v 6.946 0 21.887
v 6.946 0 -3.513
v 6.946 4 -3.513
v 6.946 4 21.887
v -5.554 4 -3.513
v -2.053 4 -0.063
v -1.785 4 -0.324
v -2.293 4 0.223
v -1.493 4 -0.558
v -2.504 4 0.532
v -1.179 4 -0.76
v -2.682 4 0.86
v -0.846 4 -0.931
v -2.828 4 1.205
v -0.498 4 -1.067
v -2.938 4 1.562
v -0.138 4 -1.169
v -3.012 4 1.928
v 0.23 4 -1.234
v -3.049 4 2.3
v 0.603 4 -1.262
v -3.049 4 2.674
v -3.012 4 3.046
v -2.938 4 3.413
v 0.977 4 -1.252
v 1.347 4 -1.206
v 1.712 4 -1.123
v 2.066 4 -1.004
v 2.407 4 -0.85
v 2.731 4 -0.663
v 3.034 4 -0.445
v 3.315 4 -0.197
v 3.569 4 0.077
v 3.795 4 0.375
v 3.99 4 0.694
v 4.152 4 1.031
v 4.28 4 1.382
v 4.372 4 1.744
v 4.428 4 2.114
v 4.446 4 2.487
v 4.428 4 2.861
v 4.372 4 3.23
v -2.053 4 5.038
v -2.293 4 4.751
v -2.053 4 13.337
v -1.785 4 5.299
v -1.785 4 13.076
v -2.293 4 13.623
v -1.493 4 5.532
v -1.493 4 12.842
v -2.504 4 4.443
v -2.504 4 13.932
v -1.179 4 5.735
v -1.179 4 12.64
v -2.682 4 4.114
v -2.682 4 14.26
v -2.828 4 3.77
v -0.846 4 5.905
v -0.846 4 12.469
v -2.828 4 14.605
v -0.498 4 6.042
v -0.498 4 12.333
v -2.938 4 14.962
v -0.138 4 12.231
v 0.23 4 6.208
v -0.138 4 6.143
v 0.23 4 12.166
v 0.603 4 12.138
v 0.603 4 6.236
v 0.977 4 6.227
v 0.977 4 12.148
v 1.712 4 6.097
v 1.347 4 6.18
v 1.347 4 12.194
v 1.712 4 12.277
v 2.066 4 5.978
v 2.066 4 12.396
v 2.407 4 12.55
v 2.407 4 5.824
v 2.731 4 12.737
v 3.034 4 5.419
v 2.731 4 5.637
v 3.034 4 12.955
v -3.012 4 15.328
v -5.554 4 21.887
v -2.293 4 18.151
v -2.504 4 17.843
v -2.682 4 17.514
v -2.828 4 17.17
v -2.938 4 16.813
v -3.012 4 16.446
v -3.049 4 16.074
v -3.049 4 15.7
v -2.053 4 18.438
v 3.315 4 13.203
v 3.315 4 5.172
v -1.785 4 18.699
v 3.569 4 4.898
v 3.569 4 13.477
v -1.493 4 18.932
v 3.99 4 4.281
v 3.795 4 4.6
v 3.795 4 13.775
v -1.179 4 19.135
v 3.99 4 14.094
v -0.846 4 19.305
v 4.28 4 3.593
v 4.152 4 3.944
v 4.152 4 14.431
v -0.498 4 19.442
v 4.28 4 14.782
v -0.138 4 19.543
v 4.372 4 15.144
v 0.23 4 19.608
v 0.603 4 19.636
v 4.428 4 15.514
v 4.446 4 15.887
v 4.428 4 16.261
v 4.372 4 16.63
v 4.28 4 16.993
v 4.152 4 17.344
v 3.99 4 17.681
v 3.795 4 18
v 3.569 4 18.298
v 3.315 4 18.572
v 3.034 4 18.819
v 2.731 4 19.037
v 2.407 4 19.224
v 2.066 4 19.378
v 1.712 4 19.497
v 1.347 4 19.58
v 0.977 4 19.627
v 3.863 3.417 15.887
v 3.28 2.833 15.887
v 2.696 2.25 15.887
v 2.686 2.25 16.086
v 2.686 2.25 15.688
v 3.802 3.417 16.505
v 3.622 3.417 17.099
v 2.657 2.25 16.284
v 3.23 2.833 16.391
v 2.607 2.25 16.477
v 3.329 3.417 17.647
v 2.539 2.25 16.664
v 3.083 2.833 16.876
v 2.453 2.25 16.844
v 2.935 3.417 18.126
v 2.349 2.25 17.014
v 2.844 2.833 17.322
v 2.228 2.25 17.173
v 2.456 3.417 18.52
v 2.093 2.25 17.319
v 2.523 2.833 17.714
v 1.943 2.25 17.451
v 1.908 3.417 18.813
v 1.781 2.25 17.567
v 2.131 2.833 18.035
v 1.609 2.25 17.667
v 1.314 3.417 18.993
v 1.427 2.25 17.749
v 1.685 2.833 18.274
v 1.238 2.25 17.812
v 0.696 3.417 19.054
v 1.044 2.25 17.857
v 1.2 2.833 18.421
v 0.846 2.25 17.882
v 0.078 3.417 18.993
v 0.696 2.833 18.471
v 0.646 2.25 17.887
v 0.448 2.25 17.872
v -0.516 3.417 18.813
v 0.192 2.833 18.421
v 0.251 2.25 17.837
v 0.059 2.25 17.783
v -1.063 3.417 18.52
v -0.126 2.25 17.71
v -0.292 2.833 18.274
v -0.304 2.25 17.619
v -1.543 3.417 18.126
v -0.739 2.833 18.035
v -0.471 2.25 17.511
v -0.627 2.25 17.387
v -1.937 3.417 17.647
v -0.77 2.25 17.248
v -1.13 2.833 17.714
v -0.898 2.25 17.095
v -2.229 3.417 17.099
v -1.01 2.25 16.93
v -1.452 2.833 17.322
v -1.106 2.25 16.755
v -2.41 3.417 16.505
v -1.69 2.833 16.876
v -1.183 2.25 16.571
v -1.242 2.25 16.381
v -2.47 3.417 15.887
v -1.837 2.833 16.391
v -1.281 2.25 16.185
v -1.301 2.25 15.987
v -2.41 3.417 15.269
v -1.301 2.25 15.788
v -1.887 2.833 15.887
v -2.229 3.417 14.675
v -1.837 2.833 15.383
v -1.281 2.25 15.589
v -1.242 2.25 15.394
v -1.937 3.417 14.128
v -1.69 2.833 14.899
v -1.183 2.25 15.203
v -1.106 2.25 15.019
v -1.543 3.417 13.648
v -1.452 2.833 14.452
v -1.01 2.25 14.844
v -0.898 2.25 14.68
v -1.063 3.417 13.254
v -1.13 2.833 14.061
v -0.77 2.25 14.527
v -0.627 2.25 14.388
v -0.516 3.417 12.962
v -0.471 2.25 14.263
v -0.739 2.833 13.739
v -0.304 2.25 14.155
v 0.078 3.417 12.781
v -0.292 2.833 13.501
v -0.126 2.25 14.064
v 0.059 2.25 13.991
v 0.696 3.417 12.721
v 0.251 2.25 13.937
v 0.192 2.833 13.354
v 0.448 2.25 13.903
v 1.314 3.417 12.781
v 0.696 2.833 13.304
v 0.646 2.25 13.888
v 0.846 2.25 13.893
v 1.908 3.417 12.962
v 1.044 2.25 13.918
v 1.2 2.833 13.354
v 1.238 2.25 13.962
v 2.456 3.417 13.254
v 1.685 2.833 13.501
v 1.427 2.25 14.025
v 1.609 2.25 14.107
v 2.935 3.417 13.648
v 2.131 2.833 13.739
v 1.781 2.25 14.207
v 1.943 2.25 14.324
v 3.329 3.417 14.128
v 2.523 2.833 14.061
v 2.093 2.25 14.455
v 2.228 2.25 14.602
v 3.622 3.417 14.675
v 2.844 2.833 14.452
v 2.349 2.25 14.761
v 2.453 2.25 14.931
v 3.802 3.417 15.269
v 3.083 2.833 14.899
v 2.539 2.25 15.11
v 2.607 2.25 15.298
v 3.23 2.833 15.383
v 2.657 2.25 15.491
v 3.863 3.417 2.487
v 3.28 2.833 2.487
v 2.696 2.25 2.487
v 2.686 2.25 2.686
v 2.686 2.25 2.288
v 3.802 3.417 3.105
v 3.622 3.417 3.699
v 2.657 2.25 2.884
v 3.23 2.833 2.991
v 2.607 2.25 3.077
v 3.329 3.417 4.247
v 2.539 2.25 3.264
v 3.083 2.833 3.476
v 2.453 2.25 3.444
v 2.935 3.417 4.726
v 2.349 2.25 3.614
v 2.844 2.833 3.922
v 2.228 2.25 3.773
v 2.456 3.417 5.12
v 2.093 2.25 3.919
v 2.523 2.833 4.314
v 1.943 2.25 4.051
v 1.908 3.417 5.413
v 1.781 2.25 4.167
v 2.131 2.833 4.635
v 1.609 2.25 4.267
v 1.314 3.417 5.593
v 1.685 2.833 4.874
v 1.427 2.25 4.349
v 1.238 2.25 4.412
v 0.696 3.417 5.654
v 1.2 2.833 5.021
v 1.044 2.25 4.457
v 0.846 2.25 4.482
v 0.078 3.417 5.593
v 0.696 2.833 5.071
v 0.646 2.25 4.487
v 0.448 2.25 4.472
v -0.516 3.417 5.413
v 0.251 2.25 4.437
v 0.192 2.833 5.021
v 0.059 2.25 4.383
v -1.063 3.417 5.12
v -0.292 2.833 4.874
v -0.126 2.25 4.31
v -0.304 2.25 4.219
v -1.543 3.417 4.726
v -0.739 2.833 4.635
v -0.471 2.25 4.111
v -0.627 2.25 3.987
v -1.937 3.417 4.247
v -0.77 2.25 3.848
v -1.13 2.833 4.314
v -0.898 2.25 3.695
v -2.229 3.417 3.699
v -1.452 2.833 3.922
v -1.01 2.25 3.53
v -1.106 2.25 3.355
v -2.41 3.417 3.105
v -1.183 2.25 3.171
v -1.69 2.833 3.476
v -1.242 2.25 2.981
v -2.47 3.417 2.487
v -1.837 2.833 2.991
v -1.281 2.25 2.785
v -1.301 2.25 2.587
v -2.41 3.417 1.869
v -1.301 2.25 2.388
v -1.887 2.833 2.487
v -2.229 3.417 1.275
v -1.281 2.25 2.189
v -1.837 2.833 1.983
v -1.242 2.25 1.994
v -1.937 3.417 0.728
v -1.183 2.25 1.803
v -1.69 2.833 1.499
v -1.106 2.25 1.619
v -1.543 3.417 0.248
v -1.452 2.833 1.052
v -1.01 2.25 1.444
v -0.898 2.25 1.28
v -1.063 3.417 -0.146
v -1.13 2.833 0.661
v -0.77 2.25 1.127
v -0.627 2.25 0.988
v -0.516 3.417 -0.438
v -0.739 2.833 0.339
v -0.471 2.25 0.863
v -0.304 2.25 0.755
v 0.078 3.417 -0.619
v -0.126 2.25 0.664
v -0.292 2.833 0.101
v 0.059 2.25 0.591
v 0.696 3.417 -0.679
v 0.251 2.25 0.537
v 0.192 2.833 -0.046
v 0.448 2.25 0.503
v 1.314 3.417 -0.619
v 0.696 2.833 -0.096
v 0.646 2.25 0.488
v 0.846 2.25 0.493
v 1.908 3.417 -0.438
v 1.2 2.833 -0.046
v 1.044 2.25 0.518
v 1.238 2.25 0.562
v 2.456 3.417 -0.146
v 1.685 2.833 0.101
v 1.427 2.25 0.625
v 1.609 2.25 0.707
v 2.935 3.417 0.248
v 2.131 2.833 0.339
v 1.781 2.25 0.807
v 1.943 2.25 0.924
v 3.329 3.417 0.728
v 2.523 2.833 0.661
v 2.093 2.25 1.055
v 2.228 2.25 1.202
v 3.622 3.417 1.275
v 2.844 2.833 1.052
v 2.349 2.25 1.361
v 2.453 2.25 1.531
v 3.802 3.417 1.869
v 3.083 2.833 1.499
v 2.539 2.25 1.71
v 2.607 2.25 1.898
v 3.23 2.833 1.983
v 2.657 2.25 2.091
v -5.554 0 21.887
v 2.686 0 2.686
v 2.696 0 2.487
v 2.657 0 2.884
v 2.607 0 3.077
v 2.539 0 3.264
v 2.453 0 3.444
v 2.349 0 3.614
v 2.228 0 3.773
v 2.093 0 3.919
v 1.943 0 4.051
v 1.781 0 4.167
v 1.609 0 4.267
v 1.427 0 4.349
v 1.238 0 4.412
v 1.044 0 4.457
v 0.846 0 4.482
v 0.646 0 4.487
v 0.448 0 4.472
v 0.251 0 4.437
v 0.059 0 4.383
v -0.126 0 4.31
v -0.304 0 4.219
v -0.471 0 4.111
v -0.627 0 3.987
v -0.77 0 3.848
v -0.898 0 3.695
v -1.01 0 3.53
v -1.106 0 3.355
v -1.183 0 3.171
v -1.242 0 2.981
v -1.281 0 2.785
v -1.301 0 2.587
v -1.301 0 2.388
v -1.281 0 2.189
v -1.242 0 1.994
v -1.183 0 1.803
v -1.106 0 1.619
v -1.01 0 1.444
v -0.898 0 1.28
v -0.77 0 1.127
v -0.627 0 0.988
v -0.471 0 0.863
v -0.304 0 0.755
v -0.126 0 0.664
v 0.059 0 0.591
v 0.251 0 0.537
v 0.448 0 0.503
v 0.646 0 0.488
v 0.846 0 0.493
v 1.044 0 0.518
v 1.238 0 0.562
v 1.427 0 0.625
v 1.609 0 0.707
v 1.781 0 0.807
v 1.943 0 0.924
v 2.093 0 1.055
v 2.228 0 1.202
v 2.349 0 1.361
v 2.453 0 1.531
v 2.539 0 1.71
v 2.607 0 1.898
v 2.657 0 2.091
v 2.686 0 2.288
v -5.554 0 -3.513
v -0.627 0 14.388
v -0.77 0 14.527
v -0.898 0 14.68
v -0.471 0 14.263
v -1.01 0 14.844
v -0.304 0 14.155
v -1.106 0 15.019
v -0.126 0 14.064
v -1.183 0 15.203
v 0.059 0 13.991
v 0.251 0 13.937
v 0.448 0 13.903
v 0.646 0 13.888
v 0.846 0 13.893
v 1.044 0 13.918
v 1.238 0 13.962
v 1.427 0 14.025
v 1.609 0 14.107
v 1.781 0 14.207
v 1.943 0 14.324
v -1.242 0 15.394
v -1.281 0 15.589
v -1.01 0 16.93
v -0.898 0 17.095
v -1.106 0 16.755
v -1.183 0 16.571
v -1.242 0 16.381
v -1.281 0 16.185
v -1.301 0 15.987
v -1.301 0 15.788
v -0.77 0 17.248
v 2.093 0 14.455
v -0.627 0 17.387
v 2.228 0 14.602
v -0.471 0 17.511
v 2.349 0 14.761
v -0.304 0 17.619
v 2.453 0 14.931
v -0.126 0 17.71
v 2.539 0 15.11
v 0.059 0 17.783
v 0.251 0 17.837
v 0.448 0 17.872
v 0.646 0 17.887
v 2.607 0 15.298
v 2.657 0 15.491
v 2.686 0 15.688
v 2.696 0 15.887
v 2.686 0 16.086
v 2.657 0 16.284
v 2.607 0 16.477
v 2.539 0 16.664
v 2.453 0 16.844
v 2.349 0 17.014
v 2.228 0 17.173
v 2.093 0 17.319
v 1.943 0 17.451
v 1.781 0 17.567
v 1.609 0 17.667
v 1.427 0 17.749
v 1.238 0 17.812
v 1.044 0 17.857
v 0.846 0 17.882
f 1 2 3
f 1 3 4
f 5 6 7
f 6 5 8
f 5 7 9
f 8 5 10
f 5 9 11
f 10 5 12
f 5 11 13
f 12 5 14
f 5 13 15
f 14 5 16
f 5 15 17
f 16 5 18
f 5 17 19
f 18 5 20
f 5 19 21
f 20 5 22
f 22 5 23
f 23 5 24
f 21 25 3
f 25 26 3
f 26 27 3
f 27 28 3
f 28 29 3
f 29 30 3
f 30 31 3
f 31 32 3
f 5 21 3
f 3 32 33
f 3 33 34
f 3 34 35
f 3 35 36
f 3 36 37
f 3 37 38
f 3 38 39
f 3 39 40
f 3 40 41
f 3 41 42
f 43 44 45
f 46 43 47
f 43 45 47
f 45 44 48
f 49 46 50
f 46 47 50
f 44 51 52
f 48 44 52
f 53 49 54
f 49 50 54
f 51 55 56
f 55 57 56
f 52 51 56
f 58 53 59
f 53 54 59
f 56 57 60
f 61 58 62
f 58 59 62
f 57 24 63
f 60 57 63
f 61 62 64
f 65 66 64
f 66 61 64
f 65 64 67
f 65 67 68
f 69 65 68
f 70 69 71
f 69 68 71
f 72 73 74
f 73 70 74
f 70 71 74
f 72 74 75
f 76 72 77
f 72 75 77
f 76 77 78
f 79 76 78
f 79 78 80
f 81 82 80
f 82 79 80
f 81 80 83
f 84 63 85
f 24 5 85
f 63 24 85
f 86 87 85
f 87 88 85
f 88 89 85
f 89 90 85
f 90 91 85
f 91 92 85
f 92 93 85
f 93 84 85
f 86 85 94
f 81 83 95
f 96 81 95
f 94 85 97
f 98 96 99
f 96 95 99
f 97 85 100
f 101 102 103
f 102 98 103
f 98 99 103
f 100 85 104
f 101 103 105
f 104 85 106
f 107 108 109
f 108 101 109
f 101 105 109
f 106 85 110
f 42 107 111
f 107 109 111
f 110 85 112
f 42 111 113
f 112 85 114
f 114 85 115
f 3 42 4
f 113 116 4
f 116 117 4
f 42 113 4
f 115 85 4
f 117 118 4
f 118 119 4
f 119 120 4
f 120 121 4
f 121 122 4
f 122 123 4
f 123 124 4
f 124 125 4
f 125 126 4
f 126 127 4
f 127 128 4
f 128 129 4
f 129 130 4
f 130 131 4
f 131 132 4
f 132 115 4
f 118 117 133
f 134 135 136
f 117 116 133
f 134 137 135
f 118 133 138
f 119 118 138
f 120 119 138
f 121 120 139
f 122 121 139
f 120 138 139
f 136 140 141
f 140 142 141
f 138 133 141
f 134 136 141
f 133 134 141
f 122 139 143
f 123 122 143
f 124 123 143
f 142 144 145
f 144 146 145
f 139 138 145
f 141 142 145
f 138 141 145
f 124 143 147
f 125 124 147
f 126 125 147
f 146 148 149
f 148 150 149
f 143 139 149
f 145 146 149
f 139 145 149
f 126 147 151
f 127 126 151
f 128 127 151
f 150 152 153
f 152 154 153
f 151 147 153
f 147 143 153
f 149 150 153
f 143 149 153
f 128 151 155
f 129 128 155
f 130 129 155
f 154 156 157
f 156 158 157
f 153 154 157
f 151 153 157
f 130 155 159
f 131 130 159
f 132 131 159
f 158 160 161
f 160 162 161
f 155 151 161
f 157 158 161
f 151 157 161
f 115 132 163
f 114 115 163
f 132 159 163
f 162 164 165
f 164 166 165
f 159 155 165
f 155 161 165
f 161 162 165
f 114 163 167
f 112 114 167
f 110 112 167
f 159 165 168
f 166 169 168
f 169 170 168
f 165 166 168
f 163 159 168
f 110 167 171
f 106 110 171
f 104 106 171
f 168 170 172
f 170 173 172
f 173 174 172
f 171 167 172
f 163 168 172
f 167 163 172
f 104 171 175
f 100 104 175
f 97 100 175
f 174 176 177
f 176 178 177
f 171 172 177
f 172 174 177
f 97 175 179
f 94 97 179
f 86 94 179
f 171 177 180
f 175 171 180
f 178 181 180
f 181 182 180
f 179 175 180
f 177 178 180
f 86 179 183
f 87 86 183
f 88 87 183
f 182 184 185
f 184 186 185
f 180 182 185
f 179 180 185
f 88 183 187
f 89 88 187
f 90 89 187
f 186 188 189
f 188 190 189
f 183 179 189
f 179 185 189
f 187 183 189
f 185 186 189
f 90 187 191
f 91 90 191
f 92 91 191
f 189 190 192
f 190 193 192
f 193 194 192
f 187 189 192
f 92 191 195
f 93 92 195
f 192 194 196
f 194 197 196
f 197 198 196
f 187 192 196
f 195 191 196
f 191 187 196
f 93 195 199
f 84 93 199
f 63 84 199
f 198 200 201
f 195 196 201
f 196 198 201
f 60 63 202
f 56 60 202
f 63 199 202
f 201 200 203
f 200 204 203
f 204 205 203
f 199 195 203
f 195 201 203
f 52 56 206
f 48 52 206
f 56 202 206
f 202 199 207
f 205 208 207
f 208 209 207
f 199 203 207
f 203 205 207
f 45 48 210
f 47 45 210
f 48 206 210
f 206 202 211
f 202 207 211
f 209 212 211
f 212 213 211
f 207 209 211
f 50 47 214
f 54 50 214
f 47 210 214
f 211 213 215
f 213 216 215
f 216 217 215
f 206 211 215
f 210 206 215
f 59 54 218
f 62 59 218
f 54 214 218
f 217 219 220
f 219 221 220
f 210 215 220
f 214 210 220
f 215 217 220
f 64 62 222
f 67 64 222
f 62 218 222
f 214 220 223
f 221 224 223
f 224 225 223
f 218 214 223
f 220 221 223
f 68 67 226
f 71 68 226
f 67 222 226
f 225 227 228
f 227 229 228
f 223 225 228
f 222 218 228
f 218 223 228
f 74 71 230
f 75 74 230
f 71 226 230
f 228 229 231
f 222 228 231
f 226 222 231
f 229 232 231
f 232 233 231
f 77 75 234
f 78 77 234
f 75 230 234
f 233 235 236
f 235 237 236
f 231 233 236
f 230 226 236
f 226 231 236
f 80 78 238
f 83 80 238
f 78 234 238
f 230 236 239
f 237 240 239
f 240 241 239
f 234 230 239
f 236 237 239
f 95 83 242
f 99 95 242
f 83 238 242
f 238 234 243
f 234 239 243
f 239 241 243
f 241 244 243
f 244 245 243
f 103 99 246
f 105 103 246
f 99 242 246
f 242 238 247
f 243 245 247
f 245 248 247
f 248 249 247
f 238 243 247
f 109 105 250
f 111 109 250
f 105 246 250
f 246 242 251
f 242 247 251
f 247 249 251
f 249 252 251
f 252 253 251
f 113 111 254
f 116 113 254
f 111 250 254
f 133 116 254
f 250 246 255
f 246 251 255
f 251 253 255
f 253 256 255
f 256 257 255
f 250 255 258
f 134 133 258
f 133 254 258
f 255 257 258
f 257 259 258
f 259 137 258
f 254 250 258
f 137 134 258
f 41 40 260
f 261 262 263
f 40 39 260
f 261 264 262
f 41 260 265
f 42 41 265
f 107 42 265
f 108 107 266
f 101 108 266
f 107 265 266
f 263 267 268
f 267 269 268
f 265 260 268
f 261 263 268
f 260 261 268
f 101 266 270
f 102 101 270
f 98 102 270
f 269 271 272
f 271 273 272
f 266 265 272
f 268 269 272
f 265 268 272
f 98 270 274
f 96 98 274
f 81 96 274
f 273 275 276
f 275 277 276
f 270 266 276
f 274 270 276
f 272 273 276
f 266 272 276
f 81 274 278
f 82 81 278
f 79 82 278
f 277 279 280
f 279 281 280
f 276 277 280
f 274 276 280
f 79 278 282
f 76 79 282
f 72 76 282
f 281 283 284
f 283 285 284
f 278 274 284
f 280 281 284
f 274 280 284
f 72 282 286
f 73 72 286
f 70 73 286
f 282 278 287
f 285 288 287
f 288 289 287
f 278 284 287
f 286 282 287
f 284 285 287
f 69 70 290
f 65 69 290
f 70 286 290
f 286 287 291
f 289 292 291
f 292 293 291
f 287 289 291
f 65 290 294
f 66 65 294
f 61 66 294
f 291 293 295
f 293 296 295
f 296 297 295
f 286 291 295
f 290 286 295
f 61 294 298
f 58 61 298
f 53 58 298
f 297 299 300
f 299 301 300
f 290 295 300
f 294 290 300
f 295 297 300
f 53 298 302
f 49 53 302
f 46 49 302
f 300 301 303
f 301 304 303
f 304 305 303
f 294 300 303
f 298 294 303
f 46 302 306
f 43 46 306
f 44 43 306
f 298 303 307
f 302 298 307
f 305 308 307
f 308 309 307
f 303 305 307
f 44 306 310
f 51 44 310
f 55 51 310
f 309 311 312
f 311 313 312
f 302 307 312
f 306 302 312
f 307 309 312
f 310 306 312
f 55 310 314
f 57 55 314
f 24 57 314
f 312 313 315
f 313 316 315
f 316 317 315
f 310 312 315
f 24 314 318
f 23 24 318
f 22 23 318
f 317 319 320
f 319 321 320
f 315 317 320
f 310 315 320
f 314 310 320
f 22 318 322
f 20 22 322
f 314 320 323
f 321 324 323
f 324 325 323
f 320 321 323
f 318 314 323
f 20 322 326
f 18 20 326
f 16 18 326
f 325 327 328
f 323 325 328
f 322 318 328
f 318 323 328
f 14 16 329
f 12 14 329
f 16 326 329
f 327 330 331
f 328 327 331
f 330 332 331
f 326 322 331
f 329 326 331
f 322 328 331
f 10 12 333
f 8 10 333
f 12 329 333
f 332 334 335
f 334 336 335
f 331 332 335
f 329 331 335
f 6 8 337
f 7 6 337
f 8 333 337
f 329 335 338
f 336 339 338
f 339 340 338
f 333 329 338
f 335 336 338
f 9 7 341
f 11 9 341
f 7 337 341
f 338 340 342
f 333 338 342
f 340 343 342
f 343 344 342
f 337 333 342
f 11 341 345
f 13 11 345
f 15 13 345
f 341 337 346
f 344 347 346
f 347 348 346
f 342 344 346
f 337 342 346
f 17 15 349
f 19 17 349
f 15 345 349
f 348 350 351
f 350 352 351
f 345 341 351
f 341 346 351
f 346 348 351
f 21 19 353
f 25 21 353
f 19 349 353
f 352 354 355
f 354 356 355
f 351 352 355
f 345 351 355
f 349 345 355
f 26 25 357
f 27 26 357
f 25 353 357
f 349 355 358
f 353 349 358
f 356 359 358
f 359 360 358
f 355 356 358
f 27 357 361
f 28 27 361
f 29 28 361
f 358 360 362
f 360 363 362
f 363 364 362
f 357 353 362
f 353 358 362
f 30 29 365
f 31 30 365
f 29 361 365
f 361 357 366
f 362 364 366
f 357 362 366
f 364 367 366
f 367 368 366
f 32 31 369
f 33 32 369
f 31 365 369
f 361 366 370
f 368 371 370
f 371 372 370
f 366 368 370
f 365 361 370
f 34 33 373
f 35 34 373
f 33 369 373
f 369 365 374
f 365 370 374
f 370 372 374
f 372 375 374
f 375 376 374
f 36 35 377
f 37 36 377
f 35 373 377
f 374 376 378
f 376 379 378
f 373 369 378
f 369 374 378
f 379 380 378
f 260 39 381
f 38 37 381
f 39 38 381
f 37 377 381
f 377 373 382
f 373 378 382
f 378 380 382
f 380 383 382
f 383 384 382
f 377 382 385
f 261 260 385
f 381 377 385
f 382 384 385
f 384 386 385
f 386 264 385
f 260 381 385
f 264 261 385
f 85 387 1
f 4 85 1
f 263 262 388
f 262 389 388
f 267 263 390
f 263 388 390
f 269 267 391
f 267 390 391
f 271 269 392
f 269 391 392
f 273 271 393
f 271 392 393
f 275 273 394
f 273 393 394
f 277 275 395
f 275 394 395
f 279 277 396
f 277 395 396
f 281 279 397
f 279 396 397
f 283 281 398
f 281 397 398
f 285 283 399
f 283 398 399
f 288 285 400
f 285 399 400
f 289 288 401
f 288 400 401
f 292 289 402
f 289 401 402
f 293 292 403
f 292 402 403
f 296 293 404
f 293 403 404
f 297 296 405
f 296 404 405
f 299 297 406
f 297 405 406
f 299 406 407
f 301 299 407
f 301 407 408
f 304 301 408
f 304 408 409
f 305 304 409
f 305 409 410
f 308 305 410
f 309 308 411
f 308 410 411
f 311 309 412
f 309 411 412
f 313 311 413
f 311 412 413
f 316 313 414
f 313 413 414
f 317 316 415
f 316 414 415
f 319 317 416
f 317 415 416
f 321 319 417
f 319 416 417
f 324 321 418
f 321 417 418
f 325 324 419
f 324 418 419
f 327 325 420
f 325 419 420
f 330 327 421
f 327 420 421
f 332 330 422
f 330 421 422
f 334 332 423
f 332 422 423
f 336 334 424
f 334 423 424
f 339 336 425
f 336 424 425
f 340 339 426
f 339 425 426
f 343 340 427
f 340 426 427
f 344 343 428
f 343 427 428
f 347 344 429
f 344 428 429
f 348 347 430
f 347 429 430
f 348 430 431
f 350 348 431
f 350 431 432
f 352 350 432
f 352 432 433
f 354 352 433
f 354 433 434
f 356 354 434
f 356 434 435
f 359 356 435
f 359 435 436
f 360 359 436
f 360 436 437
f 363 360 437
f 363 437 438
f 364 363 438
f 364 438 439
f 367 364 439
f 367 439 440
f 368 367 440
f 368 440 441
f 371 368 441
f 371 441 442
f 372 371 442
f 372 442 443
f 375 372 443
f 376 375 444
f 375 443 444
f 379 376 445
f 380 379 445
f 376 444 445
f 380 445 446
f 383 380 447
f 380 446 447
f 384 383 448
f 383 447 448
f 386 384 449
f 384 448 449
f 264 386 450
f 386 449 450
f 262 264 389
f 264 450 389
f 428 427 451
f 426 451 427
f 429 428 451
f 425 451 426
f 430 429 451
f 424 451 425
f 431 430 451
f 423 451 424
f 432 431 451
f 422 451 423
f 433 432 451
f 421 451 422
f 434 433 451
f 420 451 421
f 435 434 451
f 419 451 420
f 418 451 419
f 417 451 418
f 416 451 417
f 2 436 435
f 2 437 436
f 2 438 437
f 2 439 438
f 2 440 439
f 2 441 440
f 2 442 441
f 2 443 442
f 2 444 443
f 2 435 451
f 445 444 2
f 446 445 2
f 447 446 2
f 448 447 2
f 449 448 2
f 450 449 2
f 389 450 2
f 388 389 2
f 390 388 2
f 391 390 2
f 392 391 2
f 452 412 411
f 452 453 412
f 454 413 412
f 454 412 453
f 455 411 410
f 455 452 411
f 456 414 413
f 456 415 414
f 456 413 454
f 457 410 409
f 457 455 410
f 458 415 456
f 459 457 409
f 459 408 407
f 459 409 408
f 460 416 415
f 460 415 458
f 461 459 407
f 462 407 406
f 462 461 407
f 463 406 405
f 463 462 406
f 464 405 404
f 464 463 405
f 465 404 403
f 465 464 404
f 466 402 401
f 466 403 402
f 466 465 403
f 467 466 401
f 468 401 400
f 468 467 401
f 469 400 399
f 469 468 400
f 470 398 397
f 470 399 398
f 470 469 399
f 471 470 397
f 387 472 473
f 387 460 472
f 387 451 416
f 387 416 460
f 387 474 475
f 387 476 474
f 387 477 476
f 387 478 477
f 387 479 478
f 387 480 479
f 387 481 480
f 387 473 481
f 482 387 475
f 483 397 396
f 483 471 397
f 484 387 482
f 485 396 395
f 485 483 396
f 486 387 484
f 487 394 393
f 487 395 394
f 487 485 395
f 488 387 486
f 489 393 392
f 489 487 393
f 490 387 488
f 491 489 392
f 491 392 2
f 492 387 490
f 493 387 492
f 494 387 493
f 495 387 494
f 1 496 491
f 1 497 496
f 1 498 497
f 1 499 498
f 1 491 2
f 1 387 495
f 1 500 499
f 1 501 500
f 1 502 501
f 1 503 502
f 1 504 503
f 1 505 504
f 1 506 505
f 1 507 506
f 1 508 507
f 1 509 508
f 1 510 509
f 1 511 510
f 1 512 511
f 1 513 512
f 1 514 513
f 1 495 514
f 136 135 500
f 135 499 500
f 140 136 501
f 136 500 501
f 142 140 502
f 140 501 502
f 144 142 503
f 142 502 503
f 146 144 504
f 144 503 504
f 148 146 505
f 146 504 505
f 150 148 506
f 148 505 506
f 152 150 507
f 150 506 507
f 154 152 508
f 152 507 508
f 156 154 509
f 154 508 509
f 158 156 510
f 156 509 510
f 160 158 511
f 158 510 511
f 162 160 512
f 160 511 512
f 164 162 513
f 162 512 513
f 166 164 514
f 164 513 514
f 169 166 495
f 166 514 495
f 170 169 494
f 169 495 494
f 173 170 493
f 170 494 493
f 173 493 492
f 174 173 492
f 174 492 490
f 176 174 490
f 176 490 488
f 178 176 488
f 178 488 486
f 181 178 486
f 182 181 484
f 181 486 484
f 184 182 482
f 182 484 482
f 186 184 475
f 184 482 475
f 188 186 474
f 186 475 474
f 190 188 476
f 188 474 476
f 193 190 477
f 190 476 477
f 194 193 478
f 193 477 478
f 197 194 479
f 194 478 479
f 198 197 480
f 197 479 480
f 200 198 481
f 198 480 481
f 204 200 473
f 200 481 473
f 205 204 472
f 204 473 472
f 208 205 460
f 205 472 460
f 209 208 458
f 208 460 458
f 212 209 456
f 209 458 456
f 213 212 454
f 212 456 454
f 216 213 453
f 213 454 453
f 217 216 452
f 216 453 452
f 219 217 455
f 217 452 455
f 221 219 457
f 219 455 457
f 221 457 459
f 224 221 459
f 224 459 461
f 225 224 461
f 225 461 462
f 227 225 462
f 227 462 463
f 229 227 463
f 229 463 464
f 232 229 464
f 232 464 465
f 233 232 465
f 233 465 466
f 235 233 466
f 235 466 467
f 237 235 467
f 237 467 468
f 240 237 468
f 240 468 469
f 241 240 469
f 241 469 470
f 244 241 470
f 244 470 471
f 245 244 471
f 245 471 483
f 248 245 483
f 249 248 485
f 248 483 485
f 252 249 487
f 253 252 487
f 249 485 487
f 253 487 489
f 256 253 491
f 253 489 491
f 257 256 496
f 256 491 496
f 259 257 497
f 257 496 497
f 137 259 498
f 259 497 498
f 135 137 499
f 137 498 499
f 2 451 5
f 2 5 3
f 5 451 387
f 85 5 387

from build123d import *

# Parameters (mm, degrees)
F0_W           = 12.5
F0_H           = 25.4
F1_DEPTH       = 4
F3_D           = 4
F3_CSINK_D     = 7.5
F3_CSINK_ANGLE = 90


with BuildPart() as f1:
    # F0 (on Front) → F1 (new body)
    with BuildSketch(Plane.XZ):
        with Locations((0.696272, 9.18723)):
            Rectangle(F0_W, F0_H)
    extrude(amount=-F1_DEPTH)

    # F3 (through all)
    with Locations(Plane(origin=(0, 4, 0), x_dir=(-1, 0, 0), z_dir=(0, 1, 0))):
        with Locations((-0.696272, 15.88723), (-0.696272, 2.48723)):
            CounterSinkHole(F3_D / 2, F3_CSINK_D / 2, counter_sink_angle=F3_CSINK_ANGLE)


solid = f1.part
